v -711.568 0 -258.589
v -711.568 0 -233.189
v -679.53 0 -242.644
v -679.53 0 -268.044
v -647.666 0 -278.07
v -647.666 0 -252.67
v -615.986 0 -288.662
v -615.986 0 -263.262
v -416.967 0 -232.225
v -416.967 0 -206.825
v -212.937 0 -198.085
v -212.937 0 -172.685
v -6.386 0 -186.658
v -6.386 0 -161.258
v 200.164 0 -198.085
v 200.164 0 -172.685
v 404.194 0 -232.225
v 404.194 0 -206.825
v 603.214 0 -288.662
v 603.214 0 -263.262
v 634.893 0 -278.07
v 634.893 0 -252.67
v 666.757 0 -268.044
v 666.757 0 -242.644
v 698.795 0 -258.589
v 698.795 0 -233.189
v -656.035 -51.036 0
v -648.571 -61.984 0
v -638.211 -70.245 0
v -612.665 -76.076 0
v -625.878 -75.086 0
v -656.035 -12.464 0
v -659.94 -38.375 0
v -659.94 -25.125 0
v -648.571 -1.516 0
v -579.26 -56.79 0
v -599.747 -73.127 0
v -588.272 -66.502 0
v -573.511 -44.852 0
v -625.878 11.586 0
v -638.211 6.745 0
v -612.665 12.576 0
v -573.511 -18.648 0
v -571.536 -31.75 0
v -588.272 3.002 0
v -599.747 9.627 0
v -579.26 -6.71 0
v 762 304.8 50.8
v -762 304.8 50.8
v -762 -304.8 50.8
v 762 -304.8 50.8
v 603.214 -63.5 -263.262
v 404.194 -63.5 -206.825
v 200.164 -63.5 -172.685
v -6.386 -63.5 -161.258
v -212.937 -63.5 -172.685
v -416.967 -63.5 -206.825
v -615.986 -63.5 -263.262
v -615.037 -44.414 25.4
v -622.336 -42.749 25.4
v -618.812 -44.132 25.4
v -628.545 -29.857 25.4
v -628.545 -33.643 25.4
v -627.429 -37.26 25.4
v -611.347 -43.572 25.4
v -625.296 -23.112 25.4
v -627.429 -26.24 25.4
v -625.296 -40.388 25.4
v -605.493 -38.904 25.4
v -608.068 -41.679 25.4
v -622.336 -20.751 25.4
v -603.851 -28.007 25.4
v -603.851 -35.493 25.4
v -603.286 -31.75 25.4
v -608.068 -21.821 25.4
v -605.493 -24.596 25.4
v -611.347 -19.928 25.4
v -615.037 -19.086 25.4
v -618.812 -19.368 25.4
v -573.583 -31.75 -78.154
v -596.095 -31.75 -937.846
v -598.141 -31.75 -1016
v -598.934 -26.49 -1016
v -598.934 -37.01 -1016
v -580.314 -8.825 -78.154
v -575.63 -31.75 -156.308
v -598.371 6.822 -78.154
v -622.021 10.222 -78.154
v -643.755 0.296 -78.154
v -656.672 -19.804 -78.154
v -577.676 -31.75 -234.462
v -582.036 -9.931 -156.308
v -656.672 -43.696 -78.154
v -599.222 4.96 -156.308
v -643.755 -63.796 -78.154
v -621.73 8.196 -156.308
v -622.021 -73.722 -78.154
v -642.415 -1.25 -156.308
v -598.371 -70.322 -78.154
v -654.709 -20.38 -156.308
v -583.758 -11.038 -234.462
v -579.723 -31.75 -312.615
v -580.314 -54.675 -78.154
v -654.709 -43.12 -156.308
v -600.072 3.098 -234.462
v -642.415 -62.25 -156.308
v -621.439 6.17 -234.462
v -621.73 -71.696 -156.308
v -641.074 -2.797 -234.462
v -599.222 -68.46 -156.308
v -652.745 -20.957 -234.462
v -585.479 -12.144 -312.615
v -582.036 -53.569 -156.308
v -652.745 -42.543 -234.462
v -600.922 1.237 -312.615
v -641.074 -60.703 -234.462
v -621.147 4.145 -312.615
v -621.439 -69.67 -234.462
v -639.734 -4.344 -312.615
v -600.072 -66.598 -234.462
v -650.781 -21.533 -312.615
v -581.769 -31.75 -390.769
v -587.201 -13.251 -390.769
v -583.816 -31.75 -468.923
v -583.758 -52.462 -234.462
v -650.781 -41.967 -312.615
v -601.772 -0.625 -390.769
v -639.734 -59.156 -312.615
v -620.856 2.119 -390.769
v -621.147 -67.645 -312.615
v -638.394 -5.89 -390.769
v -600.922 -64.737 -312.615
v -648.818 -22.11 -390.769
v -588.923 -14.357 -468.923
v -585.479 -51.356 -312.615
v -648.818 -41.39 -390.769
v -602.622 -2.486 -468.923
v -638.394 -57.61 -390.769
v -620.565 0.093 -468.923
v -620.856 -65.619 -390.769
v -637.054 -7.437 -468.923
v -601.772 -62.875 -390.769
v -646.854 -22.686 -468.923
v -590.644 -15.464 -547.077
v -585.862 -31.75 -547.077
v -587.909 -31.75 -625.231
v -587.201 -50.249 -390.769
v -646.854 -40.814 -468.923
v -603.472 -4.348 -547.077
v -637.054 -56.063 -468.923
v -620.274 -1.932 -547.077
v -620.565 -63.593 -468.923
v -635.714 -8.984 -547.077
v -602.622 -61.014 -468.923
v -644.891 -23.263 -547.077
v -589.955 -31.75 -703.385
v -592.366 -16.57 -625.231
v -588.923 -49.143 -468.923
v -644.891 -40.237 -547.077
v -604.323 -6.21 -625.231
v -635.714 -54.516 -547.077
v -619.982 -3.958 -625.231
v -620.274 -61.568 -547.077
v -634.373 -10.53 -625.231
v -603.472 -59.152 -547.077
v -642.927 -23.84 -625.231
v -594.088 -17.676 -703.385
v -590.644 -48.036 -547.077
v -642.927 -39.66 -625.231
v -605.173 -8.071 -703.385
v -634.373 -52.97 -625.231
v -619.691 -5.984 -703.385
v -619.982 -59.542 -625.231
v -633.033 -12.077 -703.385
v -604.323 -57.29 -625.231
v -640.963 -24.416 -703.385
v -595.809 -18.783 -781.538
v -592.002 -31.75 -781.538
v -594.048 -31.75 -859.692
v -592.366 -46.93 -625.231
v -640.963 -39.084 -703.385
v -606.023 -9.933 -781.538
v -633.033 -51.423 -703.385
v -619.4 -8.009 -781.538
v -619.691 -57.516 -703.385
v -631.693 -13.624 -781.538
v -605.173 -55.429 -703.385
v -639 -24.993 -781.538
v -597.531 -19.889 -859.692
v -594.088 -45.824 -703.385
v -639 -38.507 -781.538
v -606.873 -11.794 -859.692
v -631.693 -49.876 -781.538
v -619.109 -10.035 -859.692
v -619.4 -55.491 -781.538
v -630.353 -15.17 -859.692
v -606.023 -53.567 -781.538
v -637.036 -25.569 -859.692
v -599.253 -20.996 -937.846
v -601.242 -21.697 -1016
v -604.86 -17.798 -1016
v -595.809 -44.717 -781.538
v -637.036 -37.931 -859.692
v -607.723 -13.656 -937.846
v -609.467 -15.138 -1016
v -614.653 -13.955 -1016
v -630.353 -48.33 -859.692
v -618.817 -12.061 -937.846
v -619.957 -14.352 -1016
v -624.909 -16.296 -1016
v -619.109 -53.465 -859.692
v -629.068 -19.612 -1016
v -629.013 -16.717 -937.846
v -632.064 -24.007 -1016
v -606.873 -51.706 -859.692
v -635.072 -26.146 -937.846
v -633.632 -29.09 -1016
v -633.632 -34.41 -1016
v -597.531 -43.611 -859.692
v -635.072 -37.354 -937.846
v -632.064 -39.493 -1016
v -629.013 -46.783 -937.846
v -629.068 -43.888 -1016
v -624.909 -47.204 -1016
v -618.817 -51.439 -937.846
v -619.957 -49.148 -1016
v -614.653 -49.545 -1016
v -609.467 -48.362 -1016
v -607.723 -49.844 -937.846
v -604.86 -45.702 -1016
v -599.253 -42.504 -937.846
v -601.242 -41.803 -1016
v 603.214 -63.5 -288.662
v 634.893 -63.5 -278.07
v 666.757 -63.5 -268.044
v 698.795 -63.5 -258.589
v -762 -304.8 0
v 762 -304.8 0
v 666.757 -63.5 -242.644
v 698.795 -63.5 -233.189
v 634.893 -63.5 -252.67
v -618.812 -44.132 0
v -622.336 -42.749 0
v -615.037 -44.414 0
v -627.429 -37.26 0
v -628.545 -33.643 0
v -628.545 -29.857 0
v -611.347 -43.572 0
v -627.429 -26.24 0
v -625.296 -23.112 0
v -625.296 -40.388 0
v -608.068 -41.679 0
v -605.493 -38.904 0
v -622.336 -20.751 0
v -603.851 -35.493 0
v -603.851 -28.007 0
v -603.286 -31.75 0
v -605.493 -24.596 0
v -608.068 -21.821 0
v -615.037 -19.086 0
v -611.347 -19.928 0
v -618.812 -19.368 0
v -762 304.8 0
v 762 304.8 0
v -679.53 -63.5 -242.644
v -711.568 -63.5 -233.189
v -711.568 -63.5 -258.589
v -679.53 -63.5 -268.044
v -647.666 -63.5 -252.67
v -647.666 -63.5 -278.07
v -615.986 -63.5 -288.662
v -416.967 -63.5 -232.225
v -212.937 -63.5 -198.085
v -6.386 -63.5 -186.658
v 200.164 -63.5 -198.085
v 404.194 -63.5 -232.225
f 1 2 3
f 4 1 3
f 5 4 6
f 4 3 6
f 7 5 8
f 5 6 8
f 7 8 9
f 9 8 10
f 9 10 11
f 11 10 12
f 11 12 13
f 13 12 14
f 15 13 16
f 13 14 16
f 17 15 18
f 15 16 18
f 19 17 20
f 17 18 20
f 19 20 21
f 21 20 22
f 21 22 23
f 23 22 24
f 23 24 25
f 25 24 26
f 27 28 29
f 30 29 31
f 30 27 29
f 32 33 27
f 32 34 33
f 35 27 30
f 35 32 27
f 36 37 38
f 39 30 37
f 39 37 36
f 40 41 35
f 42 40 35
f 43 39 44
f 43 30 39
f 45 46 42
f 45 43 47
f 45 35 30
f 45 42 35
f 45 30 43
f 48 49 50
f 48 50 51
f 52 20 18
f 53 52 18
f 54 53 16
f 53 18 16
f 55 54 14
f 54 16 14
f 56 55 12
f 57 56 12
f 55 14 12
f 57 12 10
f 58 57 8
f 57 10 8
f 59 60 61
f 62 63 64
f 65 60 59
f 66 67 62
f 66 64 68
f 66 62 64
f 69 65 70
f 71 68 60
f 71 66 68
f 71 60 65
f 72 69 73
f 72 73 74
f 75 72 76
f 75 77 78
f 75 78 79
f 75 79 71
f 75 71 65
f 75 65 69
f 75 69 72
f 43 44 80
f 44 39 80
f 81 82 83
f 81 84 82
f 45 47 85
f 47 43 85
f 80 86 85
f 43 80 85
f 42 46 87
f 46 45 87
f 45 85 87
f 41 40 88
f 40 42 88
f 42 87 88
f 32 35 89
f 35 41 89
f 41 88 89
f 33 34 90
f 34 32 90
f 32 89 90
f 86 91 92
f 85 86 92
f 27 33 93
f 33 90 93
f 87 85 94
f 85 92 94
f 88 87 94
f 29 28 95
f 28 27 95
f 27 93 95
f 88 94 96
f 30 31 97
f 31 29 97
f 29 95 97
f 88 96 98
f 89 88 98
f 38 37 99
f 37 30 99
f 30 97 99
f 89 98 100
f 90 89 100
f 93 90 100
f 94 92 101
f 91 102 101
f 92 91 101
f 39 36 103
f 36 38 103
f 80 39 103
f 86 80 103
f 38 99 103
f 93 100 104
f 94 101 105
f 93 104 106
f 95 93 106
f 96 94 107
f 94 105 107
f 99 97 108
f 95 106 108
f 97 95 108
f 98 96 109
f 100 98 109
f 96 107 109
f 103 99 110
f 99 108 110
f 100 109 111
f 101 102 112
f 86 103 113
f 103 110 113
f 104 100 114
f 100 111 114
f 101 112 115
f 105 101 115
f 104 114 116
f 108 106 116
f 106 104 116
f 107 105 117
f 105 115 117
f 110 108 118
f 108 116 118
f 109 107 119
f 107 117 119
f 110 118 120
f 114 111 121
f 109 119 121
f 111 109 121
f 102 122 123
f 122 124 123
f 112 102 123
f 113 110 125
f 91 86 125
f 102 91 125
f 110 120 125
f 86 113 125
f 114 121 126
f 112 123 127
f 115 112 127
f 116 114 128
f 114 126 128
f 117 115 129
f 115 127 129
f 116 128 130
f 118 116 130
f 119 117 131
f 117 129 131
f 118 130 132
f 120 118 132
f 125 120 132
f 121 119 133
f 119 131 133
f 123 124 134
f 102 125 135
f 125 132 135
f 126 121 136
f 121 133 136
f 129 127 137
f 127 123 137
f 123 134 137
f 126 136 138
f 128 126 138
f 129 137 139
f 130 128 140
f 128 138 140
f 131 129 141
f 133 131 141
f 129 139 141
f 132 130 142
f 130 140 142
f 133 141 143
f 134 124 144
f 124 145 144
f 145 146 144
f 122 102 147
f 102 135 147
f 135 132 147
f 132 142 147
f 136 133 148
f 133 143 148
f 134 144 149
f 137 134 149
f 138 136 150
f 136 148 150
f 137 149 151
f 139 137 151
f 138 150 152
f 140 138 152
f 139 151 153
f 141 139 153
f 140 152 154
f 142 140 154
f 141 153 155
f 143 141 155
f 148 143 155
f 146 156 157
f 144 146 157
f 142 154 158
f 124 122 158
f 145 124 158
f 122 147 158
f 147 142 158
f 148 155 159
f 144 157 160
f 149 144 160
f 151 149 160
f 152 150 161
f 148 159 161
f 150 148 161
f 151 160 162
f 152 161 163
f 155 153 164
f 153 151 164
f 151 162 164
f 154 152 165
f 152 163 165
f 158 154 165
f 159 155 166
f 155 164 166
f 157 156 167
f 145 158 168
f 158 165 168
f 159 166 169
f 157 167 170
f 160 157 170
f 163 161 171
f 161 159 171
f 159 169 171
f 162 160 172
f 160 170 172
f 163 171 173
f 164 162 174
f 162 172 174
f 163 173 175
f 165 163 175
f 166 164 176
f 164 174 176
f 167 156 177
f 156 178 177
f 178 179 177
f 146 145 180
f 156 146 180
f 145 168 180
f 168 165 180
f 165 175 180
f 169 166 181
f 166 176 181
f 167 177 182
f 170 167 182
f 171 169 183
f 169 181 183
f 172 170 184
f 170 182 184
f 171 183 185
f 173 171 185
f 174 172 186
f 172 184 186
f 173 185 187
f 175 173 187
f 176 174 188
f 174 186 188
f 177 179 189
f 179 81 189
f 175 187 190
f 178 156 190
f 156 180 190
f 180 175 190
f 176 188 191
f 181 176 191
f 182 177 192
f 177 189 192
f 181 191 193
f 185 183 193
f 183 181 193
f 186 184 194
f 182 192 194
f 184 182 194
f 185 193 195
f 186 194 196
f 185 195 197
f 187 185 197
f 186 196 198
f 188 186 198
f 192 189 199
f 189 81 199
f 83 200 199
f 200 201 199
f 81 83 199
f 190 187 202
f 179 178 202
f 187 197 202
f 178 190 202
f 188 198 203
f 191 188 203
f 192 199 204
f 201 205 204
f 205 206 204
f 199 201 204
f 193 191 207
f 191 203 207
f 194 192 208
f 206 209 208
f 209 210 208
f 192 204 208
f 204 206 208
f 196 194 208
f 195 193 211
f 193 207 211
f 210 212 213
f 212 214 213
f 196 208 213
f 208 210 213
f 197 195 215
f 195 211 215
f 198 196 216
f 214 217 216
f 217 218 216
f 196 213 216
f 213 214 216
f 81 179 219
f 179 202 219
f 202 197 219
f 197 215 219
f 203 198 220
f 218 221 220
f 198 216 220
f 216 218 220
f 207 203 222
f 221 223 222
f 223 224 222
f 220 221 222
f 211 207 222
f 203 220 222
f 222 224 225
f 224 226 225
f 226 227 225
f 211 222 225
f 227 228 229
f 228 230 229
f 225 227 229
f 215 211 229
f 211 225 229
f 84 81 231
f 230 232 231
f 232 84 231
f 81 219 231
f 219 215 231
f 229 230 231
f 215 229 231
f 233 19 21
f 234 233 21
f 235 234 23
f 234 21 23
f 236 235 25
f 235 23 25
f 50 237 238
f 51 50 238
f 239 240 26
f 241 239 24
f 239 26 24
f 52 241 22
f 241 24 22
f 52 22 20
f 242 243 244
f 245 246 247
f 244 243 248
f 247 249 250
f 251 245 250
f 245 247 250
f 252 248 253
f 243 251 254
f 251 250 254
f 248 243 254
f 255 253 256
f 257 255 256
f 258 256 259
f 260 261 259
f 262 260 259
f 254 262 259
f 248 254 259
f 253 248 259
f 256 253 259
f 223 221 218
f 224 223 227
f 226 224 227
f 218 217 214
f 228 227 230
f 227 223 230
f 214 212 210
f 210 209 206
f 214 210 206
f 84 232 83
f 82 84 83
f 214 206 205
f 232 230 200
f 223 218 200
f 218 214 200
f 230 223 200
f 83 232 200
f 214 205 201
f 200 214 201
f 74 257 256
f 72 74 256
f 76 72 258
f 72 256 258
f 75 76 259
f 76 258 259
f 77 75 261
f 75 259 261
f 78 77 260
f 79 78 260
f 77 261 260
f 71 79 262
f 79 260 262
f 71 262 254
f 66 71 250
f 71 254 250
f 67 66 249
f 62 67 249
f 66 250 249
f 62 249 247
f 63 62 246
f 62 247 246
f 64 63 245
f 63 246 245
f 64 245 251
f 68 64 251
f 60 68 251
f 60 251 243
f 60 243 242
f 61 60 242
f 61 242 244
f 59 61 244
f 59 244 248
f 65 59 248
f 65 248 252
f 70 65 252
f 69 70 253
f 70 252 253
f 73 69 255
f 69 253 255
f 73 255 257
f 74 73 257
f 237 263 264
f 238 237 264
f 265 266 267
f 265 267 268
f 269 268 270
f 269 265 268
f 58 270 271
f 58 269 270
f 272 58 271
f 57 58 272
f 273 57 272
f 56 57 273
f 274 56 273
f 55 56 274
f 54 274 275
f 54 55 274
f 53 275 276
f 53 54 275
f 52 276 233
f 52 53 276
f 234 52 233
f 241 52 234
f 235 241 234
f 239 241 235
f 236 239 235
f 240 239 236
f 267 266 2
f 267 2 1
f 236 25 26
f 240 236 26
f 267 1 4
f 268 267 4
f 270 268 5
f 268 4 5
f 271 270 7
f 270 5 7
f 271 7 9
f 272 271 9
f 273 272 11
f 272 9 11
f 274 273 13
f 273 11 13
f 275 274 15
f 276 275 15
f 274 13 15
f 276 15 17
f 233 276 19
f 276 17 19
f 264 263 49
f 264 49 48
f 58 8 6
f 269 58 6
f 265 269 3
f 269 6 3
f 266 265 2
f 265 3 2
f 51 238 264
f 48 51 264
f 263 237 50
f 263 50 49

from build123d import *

# Parameters (mm, degrees)
F0_W     = 1524
F0_H     = 609.6
F1_DEPTH = 50.8
F3_DEPTH = 63.5
F4_R     = 44.45
F5_DEPTH = 1016
F5_TAPER = 1.5
F6_R     = 12.7
F7_DEPTH = 25.4


with BuildPart() as f1:
    # F0 (on Top) → F1 (new body)
    with BuildSketch(Plane.XY):
        Rectangle(F0_W, F0_H)
    extrude(amount=F1_DEPTH)


with BuildPart() as f3:
    # F2 (on Front) → F3 (new body)
    with BuildSketch(Plane.XZ):
        with BuildLine():
            ThreePointArc((-615.9864588737, -288.6620163918), (-6.3864588737, -186.6584198724), (603.2135411263, -288.6620163918))
            ThreePointArc((603.2135411263, -288.6620163918), (650.8029751461, -272.9860498745), (698.7947821617, -258.5889454448))
            Line((698.7947821617, -258.5889454448), (698.7947821617, -233.1889454448))
            ThreePointArc((698.7947821617, -233.1889454448), (650.8029751461, -247.5860498745), (603.2135411263, -263.2620163918))
            ThreePointArc((603.2135411263, -263.2620163918), (-6.3864588737, -161.2584198724), (-615.9864588737, -263.2620163918))
            ThreePointArc((-615.9864588737, -263.2620163918), (-663.5758928936, -247.5860498745), (-711.5676999092, -233.1889454448))
            Line((-711.5676999092, -233.1889454448), (-711.5676999092, -258.5889454448))
            ThreePointArc((-711.5676999092, -258.5889454448), (-663.5758928936, -272.9860498745), (-615.9864588737, -288.6620163918))
        make_face()
    extrude(amount=F3_DEPTH)


with BuildPart() as f5:
    # F4 (on Top) → F5 (new body)
    with BuildSketch(Plane.XY):
        with Locations((-615.9864588737, -31.75)):
            Circle(F4_R)
    extrude(amount=-F5_DEPTH, taper=F5_TAPER)


with BuildPart() as f7:
    # F6 (on Top) → F7 (new body)
    with BuildSketch(Plane.XY):
        with Locations((-615.9864588737, -31.75)):
            Circle(F6_R)
    extrude(amount=F7_DEPTH)


solid = Compound([f1.part, f3.part, f5.part, f7.part])
